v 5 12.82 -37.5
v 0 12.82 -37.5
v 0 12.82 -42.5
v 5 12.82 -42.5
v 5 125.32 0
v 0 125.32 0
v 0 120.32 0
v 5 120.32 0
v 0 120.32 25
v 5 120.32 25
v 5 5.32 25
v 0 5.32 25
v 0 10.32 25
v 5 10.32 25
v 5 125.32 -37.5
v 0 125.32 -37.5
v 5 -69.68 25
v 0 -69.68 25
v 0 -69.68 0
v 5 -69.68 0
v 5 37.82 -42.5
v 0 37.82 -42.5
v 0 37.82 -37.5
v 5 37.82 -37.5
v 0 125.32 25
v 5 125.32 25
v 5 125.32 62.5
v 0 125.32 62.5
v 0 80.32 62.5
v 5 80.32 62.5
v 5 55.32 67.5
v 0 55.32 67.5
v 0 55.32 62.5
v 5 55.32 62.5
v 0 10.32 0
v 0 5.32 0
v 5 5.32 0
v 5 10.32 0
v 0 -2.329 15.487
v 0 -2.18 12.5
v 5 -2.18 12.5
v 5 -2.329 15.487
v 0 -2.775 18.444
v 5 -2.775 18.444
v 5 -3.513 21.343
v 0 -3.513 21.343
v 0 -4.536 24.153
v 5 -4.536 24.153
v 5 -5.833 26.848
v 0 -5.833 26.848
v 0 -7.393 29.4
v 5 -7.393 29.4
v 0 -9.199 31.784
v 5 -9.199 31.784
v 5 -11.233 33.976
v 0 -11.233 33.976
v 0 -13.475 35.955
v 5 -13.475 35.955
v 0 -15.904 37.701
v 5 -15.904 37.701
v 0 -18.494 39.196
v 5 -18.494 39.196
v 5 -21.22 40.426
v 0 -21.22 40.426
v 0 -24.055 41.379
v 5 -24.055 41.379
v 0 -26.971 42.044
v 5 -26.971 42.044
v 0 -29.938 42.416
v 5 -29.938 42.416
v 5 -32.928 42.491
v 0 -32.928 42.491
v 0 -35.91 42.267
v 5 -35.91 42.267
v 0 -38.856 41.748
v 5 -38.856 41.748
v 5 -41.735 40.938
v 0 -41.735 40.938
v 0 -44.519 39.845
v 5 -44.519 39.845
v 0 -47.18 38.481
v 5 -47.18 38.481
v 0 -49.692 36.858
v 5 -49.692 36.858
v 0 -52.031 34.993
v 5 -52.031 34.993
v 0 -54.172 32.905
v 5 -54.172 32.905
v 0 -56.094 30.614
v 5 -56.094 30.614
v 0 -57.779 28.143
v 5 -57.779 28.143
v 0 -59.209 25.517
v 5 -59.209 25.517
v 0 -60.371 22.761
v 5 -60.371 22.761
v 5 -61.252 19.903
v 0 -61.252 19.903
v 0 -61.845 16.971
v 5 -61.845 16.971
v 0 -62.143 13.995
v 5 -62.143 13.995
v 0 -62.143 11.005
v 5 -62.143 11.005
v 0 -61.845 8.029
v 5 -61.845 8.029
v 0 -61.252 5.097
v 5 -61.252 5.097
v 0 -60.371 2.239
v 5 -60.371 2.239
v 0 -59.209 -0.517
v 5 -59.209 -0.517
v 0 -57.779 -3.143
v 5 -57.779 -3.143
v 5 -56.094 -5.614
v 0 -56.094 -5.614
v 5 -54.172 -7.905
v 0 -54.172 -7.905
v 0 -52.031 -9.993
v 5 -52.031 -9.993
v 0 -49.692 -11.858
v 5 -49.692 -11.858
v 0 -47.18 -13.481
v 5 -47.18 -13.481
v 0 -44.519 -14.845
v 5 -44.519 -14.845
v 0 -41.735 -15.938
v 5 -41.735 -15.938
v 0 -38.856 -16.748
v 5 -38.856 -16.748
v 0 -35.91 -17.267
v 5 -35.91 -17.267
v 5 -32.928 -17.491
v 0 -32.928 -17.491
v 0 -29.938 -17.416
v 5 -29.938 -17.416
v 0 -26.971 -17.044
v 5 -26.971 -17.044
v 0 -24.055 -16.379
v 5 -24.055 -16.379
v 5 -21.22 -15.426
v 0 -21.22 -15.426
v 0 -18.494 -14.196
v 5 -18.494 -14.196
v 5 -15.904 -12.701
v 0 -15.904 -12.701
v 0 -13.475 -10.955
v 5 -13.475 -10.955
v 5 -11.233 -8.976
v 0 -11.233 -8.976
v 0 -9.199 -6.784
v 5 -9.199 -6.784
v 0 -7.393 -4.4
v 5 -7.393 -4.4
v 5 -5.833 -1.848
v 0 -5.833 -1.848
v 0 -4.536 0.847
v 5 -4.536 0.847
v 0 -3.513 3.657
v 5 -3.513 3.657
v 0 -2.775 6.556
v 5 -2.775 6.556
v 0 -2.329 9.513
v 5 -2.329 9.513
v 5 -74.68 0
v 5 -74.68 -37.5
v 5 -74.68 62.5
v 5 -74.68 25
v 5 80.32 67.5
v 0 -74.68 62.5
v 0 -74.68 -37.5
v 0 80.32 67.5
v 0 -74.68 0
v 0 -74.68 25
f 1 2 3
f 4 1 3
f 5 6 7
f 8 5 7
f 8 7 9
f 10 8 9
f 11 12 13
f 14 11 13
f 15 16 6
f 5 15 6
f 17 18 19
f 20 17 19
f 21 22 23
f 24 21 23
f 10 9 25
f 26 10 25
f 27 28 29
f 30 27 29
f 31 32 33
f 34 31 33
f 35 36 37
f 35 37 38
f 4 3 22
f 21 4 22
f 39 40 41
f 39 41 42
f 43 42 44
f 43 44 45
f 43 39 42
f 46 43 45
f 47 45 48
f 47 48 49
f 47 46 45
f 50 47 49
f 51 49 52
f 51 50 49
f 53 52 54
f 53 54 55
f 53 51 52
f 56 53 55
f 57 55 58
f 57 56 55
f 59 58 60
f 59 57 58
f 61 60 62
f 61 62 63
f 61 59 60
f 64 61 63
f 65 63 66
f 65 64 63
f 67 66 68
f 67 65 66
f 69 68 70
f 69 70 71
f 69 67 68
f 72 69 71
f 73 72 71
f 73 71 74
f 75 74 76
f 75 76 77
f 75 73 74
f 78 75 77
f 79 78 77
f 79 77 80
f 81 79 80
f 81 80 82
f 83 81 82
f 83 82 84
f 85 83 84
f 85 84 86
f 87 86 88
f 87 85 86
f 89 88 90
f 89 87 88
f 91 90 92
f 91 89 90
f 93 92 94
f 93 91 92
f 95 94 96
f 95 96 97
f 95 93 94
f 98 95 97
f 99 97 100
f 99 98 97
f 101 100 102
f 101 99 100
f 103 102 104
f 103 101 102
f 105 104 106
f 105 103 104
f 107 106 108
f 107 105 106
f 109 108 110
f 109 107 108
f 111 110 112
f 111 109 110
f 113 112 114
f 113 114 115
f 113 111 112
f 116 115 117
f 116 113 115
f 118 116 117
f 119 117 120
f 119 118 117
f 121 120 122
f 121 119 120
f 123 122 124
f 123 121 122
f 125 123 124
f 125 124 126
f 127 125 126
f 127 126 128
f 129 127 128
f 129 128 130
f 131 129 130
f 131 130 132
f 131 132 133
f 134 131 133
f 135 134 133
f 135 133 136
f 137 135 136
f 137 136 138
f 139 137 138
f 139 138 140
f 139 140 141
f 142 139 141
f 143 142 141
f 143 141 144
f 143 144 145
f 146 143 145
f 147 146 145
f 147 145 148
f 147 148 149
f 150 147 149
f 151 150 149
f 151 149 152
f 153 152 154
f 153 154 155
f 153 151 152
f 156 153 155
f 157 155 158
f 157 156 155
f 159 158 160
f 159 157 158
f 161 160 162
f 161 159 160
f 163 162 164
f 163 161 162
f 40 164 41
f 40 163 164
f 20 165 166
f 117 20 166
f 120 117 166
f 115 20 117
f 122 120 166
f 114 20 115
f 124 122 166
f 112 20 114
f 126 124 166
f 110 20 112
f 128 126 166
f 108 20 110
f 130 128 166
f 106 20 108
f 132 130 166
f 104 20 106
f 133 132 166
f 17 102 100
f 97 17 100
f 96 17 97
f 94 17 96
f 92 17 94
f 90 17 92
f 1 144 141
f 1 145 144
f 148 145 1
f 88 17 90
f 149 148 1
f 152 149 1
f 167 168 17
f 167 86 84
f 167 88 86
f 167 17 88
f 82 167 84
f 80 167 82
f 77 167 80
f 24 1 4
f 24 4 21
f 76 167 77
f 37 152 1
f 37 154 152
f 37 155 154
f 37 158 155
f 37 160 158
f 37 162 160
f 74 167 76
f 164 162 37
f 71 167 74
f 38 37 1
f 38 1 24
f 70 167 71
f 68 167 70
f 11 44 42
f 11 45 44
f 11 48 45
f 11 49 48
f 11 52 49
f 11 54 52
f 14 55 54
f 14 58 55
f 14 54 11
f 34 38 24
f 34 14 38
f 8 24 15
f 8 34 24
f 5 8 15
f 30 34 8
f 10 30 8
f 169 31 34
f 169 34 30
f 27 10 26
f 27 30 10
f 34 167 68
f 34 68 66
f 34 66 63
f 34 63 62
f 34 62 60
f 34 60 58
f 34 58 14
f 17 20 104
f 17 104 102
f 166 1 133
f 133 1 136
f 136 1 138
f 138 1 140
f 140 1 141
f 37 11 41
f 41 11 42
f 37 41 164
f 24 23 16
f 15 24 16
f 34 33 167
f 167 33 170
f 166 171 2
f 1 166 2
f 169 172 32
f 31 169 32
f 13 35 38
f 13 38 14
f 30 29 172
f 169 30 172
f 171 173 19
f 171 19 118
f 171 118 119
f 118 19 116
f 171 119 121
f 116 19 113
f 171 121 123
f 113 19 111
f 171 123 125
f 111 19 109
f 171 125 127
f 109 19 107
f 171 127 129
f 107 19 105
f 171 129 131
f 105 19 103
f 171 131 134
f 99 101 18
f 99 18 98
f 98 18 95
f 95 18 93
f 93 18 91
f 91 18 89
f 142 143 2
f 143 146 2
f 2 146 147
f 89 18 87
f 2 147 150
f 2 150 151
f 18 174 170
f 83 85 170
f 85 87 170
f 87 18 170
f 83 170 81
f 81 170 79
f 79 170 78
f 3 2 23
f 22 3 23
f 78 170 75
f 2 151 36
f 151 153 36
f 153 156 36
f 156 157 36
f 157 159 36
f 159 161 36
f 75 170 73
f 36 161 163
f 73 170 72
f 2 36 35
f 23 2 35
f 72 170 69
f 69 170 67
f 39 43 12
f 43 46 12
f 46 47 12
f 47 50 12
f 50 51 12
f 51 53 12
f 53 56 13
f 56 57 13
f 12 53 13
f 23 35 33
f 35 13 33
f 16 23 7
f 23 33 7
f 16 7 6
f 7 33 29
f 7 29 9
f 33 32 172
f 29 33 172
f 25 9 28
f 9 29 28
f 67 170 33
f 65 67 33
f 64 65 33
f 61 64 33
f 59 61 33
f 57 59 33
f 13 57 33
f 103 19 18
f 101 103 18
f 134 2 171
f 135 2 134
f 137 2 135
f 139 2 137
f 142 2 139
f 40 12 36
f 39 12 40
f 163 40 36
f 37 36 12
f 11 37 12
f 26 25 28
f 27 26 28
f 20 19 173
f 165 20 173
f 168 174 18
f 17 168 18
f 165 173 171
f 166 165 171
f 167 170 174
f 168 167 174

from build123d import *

# Parameters (mm, degrees)
F0_R     = 30
F0_W     = 5
F0_H     = 25
F1_DEPTH = 5


with BuildPart() as f1:
    # F0 (on Right) → F1 (new body)
    with BuildSketch(Plane.YZ):
        Polygon((125.319932, 62.5), (80.319932, 62.5), (80.319932, 67.5), (55.319932, 67.5), (55.319932, 62.5), (10.319932, 62.5), (-74.680068, 62.5), (-74.680068, 25), (-69.680068, 25), (-69.680068, 0), (-74.680068, 0), (-74.680068, -37.5), (12.819932, -37.5), (12.819932, -42.5), (37.819932, -42.5), (37.819932, -37.5), (125.319932, -37.5), (125.319932, 0), (120.319932, 0), (120.319932, 25), (125.319932, 25), align=None)
        with Locations((-32.180068, 12.5)):
            Circle(F0_R, mode=Mode.SUBTRACT)
        with Locations((7.819932, 12.5)):
            Rectangle(F0_W, F0_H, mode=Mode.SUBTRACT)
    extrude(amount=F1_DEPTH)


solid = f1.part
